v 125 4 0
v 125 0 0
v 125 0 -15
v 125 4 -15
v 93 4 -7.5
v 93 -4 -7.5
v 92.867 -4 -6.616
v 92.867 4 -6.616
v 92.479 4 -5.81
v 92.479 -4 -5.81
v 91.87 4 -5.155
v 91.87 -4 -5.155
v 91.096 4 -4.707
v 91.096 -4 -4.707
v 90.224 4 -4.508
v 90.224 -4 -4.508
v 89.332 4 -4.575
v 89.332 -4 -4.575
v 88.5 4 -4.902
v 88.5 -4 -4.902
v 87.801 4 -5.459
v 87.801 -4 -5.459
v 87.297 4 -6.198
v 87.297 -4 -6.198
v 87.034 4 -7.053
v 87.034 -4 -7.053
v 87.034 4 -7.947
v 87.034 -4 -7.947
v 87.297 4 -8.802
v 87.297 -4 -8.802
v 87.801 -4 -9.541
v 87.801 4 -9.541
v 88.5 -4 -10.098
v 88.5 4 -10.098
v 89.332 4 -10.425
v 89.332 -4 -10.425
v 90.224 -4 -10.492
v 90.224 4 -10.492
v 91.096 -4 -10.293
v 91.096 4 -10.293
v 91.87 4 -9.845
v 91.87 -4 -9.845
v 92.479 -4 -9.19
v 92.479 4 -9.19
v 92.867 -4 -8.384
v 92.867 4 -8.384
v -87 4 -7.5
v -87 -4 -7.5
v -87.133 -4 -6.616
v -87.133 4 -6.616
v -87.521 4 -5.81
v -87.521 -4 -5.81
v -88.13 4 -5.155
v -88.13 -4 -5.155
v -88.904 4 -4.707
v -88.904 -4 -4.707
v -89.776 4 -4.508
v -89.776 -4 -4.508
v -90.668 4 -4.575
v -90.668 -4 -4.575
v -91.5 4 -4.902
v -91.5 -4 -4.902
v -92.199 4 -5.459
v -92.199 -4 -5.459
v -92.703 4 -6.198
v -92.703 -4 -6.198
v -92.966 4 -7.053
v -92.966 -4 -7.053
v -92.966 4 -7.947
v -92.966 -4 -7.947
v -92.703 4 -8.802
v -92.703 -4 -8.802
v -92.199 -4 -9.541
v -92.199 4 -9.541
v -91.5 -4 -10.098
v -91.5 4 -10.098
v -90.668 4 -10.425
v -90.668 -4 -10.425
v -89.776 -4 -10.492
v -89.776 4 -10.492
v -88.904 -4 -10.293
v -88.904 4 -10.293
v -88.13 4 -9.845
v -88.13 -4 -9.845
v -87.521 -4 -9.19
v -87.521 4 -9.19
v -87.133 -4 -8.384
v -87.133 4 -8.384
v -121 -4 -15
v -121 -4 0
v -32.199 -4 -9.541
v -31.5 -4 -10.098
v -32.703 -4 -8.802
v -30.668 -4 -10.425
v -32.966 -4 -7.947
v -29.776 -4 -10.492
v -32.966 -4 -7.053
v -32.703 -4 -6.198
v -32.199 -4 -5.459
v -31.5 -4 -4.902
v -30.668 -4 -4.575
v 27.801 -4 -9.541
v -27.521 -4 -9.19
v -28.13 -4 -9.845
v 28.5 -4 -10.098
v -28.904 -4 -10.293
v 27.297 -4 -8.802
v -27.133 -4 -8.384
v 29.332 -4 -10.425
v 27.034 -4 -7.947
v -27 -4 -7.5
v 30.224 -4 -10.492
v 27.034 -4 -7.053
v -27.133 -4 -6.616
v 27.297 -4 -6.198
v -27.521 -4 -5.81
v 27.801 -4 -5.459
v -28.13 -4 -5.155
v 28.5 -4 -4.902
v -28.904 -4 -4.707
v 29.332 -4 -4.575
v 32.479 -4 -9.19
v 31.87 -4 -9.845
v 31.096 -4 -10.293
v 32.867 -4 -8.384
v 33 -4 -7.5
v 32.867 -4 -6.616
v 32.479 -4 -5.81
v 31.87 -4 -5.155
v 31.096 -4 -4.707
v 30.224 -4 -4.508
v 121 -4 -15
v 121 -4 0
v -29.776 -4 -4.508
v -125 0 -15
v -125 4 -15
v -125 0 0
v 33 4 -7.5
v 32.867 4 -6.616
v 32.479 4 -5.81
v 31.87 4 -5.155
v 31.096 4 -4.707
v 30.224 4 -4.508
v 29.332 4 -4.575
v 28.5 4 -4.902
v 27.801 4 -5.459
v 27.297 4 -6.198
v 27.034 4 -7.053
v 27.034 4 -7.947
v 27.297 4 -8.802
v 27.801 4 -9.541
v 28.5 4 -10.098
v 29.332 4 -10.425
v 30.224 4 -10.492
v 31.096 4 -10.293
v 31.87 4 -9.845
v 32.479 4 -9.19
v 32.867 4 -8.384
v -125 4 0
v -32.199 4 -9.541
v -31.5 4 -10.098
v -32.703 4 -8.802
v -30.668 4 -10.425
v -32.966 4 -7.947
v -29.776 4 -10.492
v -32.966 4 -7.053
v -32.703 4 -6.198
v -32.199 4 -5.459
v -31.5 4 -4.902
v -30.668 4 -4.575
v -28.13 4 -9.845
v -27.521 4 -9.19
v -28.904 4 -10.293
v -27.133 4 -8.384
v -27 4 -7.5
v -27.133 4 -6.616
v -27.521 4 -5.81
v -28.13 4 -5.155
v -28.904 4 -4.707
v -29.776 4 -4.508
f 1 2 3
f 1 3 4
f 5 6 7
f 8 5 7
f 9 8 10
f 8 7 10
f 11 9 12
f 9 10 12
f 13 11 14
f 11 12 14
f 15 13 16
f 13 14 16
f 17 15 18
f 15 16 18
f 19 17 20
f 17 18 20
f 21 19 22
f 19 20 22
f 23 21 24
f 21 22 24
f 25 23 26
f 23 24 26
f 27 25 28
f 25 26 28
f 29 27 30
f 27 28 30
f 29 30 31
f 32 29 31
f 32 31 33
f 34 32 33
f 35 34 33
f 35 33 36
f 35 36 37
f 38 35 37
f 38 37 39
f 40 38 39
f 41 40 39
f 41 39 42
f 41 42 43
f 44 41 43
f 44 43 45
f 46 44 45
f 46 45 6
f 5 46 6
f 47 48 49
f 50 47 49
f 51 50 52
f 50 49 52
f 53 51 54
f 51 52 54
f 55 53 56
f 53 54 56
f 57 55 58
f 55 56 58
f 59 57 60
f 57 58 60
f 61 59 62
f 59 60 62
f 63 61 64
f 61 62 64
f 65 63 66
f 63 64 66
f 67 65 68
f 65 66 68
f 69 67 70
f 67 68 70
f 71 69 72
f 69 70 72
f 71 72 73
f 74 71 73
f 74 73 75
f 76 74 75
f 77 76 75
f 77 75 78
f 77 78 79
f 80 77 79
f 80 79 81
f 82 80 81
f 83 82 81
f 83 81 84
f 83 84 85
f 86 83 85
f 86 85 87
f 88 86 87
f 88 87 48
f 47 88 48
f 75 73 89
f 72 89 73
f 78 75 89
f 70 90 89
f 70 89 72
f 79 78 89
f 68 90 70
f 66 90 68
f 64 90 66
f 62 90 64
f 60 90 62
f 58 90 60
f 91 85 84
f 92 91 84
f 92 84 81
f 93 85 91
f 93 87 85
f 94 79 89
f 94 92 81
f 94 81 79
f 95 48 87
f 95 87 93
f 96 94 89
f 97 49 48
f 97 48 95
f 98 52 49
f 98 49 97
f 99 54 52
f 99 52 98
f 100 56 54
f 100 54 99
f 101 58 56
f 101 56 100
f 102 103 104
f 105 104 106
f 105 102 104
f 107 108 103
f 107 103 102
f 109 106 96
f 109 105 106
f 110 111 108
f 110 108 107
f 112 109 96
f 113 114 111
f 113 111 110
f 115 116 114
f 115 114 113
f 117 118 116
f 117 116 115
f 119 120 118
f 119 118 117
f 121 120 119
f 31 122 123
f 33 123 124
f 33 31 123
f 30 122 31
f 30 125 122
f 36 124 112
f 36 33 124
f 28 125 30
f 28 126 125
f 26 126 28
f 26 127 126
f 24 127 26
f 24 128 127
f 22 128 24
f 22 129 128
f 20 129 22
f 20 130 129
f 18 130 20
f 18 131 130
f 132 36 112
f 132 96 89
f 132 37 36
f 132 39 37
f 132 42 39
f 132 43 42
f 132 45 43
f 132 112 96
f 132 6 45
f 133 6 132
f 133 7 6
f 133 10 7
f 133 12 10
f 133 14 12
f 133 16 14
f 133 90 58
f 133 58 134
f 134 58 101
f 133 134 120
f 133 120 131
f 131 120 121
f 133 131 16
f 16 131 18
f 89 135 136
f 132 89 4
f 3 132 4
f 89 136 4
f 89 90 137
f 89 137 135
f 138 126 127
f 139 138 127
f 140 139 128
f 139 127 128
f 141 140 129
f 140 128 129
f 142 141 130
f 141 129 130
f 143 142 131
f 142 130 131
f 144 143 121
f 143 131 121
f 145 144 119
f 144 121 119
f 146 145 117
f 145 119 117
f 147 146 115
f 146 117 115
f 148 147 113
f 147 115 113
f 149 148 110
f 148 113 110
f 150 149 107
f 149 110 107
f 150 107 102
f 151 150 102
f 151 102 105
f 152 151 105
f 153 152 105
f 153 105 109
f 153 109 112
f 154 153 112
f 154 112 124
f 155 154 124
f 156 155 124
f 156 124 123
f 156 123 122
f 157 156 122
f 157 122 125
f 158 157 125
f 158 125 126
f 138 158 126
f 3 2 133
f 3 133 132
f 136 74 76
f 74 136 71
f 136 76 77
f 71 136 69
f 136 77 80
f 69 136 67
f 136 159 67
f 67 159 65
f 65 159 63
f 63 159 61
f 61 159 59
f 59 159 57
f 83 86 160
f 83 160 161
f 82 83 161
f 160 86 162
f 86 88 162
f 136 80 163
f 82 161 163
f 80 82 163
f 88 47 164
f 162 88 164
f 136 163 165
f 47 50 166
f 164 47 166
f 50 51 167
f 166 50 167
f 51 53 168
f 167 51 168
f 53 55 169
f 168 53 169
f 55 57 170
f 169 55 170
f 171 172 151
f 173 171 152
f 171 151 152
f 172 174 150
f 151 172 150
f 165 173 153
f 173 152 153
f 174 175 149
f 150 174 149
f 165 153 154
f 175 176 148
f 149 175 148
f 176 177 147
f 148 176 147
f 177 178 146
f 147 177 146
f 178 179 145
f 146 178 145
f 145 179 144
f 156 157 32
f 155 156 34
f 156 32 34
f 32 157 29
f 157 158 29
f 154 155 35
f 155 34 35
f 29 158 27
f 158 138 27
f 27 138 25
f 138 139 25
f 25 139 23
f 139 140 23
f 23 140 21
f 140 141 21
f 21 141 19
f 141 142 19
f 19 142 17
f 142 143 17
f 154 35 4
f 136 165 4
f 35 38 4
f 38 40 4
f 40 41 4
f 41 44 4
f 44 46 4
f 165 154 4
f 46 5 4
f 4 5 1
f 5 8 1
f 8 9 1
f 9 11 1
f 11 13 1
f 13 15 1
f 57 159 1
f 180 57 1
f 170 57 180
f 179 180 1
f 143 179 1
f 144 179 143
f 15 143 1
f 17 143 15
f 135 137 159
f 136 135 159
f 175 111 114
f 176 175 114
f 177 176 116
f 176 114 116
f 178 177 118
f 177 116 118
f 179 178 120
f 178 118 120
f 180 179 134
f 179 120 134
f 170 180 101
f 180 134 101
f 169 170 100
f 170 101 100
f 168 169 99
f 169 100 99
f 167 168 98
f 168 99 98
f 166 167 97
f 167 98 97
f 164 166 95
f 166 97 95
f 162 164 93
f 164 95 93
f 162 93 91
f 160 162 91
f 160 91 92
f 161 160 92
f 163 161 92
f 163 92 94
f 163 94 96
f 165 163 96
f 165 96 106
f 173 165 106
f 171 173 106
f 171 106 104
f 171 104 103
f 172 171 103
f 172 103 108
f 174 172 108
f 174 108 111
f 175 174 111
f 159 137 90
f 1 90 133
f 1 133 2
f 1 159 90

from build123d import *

# Parameters (mm, degrees)
SKETCH_2_W        = 250
SKETCH_2_H        = 8
EXTRUDE_262_DEPTH = 15
HOLE_WIZARD_6_D   = 6
CHAMFER_1283_SIZE = 4


with BuildPart() as part:
    # Эскиз2 → Extrude 262 (new body)
    with BuildSketch(Plane.XY):
        Rectangle(SKETCH_2_W, SKETCH_2_H)
    extrude(amount=-EXTRUDE_262_DEPTH)

    # Отверстия-6мм (through all)
    with Locations(Plane(origin=(0, 4, 0), x_dir=(-1, 0, 0), z_dir=(0, 1, 0))):
        with Locations((90, -7.5), (-90, -7.5), (30, -7.5), (-30, -7.5)):
            Hole(HOLE_WIZARD_6_D / 2)

    # Chamfer 1283
    chamfer_1283_edges = [part.edges().sort_by_distance(p)[0] for p in [
        (125, -4, -7.5),
        (-125, -4, -7.5),
    ]]
    chamfer(chamfer_1283_edges, length=CHAMFER_1283_SIZE)


solid = part.part
